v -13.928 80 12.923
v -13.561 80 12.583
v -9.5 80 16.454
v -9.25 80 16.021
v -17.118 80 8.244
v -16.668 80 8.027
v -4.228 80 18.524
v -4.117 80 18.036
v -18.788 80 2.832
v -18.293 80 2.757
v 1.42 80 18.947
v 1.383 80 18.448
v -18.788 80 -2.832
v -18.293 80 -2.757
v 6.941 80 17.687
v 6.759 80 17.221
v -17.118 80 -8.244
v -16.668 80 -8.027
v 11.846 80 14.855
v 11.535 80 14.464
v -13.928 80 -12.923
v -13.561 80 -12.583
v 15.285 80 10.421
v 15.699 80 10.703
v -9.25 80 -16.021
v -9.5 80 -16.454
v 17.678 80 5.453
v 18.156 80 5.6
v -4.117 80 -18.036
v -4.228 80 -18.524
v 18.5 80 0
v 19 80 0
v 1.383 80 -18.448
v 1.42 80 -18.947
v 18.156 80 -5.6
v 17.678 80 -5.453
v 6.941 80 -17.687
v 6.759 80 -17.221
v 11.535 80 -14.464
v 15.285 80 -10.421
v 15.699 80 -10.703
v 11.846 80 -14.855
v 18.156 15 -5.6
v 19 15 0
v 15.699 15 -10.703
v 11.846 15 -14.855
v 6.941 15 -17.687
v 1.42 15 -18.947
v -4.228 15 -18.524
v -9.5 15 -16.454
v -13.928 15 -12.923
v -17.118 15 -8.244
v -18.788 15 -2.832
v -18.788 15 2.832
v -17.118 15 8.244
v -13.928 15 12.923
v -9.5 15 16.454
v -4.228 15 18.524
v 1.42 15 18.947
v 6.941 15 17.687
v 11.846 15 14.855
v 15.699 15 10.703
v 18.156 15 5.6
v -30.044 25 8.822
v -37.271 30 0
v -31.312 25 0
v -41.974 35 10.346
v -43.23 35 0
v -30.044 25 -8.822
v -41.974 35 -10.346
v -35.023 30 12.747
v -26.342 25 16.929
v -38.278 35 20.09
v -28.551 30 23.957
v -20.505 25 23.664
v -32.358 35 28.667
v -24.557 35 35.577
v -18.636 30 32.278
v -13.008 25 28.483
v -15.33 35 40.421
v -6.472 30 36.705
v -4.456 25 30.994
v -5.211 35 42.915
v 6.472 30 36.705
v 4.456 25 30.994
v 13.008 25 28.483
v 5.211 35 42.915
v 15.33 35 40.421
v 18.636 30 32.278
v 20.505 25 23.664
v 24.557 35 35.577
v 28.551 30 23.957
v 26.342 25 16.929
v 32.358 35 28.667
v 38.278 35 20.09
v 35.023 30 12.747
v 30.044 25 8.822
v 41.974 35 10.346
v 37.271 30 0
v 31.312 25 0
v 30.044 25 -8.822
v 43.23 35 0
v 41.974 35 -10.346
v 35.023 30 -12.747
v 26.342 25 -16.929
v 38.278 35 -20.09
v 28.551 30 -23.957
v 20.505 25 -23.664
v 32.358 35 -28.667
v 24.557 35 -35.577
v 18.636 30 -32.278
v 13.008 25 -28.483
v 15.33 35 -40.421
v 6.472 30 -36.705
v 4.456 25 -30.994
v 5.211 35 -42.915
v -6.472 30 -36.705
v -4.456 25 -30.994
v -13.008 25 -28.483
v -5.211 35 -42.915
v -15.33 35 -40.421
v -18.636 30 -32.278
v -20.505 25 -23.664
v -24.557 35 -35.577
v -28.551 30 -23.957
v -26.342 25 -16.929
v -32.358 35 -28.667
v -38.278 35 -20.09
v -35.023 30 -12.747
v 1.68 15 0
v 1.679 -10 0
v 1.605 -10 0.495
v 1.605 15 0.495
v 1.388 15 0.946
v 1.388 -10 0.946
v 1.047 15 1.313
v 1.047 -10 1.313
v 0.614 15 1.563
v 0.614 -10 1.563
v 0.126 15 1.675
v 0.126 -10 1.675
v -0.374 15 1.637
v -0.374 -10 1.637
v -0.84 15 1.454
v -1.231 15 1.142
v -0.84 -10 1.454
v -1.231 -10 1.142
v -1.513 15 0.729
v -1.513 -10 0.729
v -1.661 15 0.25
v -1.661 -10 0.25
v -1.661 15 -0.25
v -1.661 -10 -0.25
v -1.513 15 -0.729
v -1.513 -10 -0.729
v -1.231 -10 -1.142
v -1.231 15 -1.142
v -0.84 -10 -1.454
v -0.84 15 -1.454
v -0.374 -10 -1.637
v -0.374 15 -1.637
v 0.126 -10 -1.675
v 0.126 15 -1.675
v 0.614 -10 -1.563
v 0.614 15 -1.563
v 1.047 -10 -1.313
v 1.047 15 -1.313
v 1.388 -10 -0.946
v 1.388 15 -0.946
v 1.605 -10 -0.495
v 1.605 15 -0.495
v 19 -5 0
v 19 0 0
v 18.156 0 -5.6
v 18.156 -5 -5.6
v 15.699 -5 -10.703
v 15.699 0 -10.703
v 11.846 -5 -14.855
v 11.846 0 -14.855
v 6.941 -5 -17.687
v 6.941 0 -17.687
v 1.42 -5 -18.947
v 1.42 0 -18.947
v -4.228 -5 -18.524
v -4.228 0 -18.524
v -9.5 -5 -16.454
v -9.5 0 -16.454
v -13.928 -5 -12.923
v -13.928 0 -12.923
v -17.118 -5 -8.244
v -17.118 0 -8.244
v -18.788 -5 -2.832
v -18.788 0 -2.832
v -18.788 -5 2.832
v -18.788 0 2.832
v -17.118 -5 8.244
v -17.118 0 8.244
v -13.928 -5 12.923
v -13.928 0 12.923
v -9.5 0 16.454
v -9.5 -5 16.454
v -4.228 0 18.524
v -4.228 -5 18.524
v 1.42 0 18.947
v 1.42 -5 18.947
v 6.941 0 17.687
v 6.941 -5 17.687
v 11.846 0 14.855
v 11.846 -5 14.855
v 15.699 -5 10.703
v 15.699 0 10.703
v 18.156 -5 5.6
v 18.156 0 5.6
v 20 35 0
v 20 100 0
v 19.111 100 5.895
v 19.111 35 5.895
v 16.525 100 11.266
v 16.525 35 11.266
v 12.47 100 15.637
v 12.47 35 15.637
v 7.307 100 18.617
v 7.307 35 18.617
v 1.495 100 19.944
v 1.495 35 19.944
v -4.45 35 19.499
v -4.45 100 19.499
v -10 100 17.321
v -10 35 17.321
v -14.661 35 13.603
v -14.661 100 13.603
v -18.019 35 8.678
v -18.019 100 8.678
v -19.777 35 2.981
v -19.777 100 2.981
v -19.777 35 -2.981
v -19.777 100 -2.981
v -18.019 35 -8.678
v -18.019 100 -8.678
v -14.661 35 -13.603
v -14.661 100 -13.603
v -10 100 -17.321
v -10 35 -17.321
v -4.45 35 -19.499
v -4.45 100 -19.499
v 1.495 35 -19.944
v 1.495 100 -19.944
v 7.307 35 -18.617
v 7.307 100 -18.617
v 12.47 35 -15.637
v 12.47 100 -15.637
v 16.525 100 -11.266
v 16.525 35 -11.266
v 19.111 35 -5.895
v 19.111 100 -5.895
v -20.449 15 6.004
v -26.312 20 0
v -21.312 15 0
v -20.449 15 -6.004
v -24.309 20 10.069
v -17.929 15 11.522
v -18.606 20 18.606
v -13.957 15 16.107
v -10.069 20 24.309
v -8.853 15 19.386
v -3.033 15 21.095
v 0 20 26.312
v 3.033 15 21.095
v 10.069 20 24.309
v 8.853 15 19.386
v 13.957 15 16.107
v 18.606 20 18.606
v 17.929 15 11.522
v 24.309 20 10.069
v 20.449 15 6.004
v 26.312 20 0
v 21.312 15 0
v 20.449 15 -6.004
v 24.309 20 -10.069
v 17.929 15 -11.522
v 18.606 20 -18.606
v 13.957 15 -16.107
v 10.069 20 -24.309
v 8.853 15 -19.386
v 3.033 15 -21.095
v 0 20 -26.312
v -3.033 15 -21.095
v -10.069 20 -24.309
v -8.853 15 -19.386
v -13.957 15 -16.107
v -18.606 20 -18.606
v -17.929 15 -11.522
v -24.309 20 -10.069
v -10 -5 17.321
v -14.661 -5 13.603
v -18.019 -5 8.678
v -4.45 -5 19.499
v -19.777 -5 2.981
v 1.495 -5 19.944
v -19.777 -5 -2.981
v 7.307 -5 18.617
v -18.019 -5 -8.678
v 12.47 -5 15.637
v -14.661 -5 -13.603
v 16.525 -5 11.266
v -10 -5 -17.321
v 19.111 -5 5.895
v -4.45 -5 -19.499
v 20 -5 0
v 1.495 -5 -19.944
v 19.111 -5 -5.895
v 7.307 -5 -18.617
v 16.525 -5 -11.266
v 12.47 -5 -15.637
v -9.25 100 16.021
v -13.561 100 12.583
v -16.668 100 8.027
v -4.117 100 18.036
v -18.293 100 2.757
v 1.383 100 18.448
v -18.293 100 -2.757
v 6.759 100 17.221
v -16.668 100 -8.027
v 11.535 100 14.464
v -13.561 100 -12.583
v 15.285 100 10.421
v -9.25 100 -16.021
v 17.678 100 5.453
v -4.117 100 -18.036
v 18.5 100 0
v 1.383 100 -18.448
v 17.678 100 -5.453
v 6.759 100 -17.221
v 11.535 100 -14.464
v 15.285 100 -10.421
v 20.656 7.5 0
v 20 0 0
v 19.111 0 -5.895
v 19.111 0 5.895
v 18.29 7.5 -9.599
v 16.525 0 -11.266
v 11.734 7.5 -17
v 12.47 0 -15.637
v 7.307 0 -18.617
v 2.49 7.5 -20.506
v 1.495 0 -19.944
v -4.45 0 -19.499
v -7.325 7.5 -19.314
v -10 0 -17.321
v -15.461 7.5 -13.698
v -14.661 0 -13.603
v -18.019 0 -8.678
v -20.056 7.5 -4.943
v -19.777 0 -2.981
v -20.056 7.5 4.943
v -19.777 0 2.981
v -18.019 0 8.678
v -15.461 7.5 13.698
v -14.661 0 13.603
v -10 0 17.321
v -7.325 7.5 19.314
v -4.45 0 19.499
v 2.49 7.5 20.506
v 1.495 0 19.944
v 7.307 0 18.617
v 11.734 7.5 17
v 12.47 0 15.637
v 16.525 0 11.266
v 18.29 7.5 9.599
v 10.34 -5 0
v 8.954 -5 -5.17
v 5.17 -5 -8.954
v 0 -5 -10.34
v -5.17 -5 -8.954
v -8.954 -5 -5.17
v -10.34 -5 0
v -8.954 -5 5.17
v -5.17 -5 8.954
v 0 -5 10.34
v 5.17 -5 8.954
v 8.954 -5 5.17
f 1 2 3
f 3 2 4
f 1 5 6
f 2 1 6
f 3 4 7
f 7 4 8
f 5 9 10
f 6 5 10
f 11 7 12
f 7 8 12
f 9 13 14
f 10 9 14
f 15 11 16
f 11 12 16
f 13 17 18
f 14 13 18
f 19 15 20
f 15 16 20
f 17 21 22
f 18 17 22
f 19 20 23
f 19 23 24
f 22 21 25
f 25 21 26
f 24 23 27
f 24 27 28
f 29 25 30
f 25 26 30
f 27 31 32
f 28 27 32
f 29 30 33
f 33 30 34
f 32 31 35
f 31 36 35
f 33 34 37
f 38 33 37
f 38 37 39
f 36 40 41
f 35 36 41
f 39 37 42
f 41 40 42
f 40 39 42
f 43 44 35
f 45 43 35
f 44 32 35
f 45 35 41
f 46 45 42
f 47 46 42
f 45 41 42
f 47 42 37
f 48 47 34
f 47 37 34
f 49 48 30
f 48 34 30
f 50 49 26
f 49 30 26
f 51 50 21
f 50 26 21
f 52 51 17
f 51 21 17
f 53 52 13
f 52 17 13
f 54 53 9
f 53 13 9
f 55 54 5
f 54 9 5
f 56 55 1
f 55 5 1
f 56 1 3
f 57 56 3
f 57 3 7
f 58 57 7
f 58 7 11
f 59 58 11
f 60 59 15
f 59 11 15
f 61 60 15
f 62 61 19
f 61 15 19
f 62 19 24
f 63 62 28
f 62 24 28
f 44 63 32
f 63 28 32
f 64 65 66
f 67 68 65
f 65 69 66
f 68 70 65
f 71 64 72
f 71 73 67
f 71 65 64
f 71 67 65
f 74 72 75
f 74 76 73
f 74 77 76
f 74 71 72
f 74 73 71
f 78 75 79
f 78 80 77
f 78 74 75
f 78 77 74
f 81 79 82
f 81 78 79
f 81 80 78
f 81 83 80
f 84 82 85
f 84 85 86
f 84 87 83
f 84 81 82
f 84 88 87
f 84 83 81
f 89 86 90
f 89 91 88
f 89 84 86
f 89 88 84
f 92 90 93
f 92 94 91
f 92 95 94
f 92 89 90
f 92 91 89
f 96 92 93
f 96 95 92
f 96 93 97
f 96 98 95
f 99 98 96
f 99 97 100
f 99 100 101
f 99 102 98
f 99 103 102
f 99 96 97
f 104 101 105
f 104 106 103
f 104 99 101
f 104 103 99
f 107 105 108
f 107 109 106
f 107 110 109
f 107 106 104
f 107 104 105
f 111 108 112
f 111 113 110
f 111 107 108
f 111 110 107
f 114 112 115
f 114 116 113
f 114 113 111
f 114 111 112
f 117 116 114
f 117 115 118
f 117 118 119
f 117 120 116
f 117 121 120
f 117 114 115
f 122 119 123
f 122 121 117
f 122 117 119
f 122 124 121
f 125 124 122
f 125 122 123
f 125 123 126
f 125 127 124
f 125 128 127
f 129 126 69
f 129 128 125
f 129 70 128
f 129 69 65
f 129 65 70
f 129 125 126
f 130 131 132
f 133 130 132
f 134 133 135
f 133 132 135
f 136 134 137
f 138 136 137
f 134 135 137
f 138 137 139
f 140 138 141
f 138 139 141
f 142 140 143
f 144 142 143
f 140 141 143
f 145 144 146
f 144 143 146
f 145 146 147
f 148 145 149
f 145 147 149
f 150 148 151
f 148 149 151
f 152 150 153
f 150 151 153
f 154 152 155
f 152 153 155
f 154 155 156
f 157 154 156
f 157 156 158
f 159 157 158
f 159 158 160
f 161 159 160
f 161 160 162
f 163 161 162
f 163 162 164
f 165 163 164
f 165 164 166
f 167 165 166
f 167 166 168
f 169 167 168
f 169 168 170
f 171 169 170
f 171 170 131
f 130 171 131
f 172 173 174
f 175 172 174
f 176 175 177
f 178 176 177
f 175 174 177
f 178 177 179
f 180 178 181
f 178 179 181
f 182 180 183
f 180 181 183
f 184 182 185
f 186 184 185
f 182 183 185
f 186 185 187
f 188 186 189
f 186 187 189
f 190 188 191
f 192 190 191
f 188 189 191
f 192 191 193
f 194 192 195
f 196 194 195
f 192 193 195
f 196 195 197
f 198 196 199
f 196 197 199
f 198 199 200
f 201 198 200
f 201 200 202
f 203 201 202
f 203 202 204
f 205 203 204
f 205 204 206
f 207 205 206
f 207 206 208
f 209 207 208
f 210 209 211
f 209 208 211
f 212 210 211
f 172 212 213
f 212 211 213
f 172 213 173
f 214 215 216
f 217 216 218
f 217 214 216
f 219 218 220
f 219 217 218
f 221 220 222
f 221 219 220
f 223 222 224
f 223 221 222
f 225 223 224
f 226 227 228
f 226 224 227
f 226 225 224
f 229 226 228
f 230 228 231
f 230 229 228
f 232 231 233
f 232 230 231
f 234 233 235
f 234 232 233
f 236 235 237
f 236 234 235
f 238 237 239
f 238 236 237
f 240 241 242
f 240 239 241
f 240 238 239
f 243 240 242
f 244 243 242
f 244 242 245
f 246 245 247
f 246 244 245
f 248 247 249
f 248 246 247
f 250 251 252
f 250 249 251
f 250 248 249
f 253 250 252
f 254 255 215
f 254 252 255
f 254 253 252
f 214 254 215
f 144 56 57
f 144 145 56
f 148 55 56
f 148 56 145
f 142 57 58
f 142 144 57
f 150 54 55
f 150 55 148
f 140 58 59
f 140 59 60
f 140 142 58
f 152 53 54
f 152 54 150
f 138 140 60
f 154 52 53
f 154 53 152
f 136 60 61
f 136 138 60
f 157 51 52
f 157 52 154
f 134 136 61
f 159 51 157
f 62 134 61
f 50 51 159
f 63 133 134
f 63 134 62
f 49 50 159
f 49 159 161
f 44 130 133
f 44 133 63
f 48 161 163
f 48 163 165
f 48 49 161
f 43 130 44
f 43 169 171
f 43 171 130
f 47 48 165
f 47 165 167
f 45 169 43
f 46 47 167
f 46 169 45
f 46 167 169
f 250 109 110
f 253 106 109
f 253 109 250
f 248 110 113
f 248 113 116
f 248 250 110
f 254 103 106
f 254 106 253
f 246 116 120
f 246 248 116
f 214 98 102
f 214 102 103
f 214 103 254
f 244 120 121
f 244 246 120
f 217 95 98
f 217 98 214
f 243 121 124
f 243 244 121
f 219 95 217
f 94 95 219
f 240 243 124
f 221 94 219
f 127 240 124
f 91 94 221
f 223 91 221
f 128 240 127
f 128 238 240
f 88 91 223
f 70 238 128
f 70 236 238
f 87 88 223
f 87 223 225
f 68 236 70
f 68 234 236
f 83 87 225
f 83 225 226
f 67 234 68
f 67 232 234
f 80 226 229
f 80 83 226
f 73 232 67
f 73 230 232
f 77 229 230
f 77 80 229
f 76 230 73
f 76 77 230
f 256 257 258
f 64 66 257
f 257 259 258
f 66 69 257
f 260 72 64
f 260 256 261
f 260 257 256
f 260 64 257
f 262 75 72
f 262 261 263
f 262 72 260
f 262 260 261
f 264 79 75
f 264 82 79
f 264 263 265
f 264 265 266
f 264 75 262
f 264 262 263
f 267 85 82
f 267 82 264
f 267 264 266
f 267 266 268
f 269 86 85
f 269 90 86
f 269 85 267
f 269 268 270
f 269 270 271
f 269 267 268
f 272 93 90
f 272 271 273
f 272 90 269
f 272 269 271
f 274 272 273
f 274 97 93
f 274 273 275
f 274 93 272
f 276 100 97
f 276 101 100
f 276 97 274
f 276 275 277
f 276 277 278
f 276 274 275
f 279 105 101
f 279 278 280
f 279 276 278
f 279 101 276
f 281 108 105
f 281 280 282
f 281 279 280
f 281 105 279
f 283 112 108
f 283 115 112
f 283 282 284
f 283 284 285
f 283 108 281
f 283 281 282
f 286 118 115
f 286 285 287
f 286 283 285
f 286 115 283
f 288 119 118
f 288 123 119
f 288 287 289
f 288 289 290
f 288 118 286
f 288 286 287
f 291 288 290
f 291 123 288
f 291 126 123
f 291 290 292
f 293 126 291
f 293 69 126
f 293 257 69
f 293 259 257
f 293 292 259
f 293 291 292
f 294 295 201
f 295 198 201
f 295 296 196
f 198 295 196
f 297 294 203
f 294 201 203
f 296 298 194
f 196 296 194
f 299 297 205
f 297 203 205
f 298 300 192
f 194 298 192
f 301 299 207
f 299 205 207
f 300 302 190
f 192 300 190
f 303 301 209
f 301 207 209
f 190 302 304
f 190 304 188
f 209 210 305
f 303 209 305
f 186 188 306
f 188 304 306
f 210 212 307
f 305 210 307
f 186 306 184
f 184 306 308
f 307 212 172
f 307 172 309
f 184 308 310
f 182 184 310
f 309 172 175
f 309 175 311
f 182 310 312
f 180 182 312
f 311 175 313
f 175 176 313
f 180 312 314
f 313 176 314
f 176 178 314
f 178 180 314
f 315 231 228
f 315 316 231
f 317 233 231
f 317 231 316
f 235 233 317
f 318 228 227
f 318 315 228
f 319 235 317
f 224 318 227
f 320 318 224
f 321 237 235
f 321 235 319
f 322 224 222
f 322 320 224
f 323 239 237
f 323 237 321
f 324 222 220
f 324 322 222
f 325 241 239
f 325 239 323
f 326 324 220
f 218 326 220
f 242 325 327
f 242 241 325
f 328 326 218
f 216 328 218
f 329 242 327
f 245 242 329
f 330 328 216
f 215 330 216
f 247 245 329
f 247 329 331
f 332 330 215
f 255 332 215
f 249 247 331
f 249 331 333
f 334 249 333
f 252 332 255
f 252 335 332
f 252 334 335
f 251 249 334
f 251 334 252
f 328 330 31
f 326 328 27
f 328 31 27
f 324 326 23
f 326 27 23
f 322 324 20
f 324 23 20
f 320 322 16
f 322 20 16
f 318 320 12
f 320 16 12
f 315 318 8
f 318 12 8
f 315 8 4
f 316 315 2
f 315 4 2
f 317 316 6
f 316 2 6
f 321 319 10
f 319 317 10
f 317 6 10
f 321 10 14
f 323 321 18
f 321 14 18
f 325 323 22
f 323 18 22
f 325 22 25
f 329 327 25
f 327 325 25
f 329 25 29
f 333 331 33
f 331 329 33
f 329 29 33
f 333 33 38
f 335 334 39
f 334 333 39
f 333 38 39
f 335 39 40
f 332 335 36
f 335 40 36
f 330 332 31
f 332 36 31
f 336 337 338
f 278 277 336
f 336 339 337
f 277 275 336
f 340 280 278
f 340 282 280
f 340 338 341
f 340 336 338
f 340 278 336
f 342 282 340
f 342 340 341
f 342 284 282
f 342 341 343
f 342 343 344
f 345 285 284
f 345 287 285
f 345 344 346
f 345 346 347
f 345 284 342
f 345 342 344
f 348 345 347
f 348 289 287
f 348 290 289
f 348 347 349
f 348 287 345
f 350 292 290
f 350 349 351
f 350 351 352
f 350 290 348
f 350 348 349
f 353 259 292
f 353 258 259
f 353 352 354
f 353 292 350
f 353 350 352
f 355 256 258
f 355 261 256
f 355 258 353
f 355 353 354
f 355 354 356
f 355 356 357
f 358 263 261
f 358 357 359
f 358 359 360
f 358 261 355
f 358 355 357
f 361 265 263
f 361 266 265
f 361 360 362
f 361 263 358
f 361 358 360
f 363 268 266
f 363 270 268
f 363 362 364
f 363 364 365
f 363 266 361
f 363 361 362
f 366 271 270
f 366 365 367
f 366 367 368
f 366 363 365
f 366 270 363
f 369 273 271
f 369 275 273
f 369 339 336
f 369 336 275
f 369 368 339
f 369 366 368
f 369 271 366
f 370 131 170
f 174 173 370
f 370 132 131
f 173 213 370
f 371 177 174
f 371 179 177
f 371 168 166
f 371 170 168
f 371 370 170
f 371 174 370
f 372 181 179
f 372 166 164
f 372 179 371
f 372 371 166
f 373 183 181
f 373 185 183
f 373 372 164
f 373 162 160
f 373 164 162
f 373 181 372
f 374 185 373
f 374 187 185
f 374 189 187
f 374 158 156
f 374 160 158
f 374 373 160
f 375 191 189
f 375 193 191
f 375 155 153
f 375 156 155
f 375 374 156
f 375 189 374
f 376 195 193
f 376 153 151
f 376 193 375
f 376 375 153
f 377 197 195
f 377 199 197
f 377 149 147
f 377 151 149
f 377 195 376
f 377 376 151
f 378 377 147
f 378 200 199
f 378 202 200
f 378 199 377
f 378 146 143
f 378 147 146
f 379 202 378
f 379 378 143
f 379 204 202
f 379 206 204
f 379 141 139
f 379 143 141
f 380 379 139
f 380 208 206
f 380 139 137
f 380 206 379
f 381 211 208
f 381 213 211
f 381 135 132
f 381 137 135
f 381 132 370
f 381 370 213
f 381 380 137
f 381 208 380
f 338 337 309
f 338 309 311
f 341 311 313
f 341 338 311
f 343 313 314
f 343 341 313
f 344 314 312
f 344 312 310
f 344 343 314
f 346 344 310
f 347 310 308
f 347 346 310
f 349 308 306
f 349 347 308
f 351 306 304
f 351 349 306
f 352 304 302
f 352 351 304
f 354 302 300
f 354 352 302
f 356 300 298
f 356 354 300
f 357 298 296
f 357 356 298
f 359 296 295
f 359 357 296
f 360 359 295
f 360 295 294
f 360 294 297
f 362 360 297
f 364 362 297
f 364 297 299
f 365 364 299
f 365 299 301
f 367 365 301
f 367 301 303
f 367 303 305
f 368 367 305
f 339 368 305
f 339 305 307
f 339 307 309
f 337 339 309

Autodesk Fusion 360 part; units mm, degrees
sketch "Sketch1" plane through (0, 0, 0) normal (0, 1, 0) x (1, 0, 0)
  circle A0 centre (0, 0) radius 20
  circle A1 centre (0, 0) radius 21.5
  dimension "d1" = 40
  dimension "d2" = 1.5
extrude "Extrude1" add sketch "Sketch1" along normal blind 100

Autodesk Fusion 360 part; units mm, degrees
sketch "Sketch1" plane through (0, 0, 0) normal (0, 1, 0) x (1, 0, 0)
  circle A0 centre (0, 0) radius 18.5
  circle A1 centre (0, 0) radius 20
  dimension "d1" = 37
  dimension "d2" = 1.5
extrude "Extrude1" add sketch "Sketch1" along normal blind 15 draft 5 and the other way blind 5
sketch "Sketch2" plane through (0, 15, 0) normal (0, 1, 0) x (-1, 0, 0)
  circle A0 centre (0, 0) radius 17.1877
  circle A1 centre (0, 0) radius 21.3123
  circle A2 centre (0, 0) radius 17.1877
  circle A3 centre (0, 0) radius 21.3123
extrude "Extrude2" add sketch "Sketch2" along normal blind 10 draft 45
sketch "Sketch3" plane through (0, 25, 0) normal (0, 1, 0) x (-1, 0, 0)
  circle A0 centre (0, 0) radius 7.1877
  circle A1 centre (0, 0) radius 31.3123
  circle A2 centre (0, 0) radius 12.1877
  circle A3 centre (0, 0) radius 26.3123
extrude "Extrude3" add sketch "Sketch3" along normal blind 10 draft 50 contours A1 | A3
sketch "Sketch4" plane through (0, 25, 0) normal (0, 1, 0) x (-1, 0, 0)
  circle A0 centre (0, 0) radius 12.1877
  circle A1 centre (0, 0) radius 7.1877
  circle A2 centre (0, 0) radius 7.1877
extrude "Extrude4" cut sketch "Sketch4" along normal blind 60 contours A1 A2
sketch "Sketch5" plane through (0, 35, 0) normal (0, 1, 0) x (-1, 0, 0)
  circle A0 centre (0, 0) radius 7.1877
  circle A1 centre (0, 0) radius 43.2299
  circle A2 centre (0, 0) radius 35
extrude "Extrude5" cut sketch "Sketch5" against normal blind 20 draft -50 contours A2
ref_plane "WorkPlane1" through (0, 15, 0) normal (0, 1, 0) x (0, 0, 1)
sketch "Sketch6" plane through (0, 15, 0) normal (0, 1, 0) x (1, 0, 0)
  circle A0 centre (0, 0) radius 19
  dimension "d16" = 38
extrude "Extrude6" cut sketch "Sketch6" along normal blind -70 and the other way blind -65
sketch "Sketch7" plane through (0, 15, 0) normal (0, 1, 0) x (1, 0, 0)
  circle A0 centre (0, 0) radius 19
extrude "Extrude7" add sketch "Sketch7" against normal blind 15
sketch "Sketch8" plane through (0, 0, 0) normal (0, -1, 0) x (1, 0, 0)
  circle A0 centre (0, 0) radius 19
  circle A1 centre (0, 0) radius 19
extrude "Extrude8" add sketch "Sketch8" along normal blind 10 draft -60
sketch "Sketch9" plane through (0, -10, 0) normal (0, -1, 0) x (1, 0, 0)
  circle A0 centre (0, 0) radius 1.6795
  circle A1 centre (0, 0) radius 1.6795
  dimension "d27" = 3.359
extrude "Extrude9" cut sketch "Sketch9" against normal blind 60
